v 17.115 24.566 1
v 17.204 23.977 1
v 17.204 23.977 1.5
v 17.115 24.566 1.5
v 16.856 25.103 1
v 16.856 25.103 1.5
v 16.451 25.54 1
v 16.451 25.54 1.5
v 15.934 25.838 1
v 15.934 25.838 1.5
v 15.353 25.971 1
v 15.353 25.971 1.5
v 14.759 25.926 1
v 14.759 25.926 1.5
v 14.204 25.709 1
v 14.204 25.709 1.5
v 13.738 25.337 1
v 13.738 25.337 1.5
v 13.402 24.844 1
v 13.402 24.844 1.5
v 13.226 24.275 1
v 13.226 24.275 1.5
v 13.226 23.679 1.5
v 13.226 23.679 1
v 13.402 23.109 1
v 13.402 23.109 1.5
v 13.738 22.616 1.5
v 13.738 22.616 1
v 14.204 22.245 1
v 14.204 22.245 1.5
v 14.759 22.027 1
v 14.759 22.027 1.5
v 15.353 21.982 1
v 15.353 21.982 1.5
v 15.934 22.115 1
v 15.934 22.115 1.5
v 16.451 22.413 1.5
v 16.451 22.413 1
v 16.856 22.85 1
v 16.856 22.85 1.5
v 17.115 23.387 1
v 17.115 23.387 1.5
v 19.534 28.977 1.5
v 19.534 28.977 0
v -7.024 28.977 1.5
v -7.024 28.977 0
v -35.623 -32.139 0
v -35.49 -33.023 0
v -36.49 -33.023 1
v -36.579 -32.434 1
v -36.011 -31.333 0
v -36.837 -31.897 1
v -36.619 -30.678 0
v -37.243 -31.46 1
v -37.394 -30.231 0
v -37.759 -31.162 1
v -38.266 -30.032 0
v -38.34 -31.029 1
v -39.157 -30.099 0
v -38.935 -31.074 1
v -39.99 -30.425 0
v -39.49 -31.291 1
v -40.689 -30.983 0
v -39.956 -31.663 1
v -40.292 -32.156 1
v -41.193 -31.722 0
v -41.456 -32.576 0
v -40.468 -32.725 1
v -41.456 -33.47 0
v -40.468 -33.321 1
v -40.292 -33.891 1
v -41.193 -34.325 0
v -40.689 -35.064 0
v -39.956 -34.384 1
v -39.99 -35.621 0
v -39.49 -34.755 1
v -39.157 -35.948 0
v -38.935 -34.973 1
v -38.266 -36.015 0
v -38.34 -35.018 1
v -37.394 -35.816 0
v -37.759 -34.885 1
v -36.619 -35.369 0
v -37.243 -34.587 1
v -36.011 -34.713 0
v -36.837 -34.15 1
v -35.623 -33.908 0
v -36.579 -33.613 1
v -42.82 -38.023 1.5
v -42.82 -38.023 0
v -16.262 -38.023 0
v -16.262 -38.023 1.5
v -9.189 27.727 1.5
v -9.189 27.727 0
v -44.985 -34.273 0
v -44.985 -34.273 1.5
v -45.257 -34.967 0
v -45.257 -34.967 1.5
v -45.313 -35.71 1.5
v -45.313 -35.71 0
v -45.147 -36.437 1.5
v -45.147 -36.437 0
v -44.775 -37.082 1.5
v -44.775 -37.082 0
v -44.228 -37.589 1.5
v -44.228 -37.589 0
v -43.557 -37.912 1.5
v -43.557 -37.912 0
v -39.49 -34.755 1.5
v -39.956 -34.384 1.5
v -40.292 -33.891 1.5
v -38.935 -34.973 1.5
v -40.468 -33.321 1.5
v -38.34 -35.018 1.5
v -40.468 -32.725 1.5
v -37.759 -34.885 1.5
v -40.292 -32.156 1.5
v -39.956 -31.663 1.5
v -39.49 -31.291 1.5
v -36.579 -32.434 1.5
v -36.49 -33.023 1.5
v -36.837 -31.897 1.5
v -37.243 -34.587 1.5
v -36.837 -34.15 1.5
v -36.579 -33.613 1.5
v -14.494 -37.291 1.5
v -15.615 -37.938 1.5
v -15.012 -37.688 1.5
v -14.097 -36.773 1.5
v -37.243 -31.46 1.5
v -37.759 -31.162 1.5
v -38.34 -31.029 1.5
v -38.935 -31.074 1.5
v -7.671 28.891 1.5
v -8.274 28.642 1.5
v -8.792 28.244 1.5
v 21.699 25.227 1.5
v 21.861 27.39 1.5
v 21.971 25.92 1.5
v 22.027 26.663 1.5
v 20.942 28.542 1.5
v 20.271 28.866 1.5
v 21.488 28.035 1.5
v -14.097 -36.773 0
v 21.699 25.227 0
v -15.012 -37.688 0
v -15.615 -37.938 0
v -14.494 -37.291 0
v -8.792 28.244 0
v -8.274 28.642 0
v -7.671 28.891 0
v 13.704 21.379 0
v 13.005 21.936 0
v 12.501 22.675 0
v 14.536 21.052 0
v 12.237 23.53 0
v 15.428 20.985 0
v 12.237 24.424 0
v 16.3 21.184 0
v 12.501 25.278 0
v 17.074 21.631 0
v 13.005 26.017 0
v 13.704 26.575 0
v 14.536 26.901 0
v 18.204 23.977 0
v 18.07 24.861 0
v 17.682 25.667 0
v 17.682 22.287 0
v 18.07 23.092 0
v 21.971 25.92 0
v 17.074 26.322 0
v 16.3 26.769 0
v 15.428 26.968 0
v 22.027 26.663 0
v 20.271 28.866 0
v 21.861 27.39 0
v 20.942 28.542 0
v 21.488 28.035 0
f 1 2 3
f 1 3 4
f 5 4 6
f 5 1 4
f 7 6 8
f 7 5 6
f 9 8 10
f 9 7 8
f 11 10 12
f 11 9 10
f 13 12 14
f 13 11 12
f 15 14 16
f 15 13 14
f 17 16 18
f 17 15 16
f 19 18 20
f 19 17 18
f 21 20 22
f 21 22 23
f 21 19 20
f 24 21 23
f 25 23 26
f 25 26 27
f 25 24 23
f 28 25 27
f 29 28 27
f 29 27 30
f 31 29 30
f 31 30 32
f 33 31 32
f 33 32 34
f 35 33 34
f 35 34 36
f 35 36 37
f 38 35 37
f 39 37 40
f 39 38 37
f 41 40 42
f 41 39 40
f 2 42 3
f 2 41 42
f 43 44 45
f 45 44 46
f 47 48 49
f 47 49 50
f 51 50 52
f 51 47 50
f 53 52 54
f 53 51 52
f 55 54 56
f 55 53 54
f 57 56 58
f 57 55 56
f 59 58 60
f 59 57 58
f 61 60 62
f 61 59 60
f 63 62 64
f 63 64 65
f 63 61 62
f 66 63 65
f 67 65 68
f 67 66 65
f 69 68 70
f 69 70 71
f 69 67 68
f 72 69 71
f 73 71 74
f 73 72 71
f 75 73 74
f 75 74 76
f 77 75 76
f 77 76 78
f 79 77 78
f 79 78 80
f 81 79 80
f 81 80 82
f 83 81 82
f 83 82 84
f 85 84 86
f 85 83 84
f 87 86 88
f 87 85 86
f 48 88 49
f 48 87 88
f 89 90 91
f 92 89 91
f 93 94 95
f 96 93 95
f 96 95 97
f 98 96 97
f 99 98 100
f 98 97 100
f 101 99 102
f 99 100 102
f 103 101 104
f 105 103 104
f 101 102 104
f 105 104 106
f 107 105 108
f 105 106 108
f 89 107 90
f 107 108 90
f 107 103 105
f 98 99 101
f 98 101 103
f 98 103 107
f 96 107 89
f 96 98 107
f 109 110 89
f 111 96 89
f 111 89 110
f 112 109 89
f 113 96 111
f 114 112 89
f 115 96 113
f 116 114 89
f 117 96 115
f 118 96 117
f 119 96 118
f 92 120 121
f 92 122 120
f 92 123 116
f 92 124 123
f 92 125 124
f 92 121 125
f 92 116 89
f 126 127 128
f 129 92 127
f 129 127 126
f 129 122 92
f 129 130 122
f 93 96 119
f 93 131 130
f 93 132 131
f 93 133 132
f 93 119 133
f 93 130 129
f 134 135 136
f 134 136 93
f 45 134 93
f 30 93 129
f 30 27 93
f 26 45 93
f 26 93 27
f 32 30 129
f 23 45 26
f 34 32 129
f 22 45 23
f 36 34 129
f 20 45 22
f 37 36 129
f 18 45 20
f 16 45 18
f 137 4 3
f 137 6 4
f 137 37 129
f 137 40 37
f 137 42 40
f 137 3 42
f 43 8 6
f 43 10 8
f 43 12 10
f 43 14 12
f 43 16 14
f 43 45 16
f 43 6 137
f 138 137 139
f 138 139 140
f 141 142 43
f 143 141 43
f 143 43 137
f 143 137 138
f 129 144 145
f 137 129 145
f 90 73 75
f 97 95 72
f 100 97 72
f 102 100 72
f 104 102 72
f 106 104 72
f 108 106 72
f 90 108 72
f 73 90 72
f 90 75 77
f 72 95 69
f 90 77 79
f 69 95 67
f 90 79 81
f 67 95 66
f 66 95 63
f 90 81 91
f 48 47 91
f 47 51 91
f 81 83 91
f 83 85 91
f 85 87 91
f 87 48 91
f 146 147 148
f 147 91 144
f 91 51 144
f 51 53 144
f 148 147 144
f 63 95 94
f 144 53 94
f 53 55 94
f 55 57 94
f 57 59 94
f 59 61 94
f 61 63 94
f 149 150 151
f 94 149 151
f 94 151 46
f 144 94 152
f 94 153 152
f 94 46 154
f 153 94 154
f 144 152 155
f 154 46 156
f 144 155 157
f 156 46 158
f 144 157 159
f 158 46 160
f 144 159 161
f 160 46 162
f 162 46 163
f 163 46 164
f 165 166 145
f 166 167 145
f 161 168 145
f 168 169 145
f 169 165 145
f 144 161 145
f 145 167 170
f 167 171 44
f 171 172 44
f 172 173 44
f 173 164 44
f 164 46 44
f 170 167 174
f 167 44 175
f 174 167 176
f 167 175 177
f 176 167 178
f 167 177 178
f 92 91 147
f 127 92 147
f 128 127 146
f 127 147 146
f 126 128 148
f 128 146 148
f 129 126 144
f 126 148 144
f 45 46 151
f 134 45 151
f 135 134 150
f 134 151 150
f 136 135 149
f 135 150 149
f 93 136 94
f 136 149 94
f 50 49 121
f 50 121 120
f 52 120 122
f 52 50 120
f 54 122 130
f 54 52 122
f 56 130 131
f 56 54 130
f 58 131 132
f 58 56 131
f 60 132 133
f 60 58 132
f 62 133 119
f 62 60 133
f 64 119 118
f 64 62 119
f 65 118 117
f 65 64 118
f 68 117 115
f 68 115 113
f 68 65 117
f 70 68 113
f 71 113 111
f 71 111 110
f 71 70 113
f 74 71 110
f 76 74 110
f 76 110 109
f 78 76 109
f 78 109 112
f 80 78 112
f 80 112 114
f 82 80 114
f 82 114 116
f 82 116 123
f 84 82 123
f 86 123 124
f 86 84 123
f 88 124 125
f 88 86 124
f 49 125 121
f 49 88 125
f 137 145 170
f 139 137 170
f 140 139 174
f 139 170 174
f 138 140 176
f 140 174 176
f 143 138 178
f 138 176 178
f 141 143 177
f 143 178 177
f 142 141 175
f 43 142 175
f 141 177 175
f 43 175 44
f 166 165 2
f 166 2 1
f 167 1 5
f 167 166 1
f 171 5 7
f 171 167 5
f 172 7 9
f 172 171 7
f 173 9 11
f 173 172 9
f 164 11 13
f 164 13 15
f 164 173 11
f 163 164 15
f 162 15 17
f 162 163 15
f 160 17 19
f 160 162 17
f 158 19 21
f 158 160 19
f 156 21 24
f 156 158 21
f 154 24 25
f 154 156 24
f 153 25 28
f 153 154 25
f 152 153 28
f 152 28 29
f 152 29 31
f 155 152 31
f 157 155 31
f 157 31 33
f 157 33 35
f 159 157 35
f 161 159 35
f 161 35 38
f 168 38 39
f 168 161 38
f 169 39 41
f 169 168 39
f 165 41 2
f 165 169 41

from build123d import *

# Parameters (mm, degrees)
F0_R     = 2
F1_DEPTH = 1.5
F2_SIZE  = 1


with BuildPart() as f1:
    # F0 (on Top) → F1 (new body)
    with BuildSketch(Plane.XY):
        with BuildLine():
            Line((-9.189322, 27.726636), (-44.985039, -34.273364))
            ThreePointArc((-44.985039, -34.273364), (-44.985039, -36.773364), (-42.819975, -38.023364))
            Line((-42.819975, -38.023364), (-16.261863, -38.023364))
            ThreePointArc((-16.261863, -38.023364), (-15.011863, -37.688427), (-14.096799, -36.773364))
            Line((-14.096799, -36.773364), (21.698917, 25.226636))
            ThreePointArc((21.698917, 25.226636), (21.698917, 27.726636), (19.533854, 28.976636))
            Line((19.533854, 28.976636), (-7.024259, 28.976636))
            ThreePointArc((-7.024259, 28.976636), (-8.274259, 28.6417), (-9.189322, 27.726636))
        make_face()
        with Locations((-38.489848, -33.023364)):
            Circle(F0_R, mode=Mode.SUBTRACT)
        with Locations((15.203727, 23.976636)):
            Circle(F0_R, mode=Mode.SUBTRACT)
    extrude(amount=F1_DEPTH)

    # F2
    f2_edges = [f1.edges().sort_by_distance(p)[0] for p in [
        (13.203727, 23.976636, 0),
        (-40.489848, -33.023364, 0),
    ]]
    chamfer(f2_edges, length=F2_SIZE)


solid = f1.part
